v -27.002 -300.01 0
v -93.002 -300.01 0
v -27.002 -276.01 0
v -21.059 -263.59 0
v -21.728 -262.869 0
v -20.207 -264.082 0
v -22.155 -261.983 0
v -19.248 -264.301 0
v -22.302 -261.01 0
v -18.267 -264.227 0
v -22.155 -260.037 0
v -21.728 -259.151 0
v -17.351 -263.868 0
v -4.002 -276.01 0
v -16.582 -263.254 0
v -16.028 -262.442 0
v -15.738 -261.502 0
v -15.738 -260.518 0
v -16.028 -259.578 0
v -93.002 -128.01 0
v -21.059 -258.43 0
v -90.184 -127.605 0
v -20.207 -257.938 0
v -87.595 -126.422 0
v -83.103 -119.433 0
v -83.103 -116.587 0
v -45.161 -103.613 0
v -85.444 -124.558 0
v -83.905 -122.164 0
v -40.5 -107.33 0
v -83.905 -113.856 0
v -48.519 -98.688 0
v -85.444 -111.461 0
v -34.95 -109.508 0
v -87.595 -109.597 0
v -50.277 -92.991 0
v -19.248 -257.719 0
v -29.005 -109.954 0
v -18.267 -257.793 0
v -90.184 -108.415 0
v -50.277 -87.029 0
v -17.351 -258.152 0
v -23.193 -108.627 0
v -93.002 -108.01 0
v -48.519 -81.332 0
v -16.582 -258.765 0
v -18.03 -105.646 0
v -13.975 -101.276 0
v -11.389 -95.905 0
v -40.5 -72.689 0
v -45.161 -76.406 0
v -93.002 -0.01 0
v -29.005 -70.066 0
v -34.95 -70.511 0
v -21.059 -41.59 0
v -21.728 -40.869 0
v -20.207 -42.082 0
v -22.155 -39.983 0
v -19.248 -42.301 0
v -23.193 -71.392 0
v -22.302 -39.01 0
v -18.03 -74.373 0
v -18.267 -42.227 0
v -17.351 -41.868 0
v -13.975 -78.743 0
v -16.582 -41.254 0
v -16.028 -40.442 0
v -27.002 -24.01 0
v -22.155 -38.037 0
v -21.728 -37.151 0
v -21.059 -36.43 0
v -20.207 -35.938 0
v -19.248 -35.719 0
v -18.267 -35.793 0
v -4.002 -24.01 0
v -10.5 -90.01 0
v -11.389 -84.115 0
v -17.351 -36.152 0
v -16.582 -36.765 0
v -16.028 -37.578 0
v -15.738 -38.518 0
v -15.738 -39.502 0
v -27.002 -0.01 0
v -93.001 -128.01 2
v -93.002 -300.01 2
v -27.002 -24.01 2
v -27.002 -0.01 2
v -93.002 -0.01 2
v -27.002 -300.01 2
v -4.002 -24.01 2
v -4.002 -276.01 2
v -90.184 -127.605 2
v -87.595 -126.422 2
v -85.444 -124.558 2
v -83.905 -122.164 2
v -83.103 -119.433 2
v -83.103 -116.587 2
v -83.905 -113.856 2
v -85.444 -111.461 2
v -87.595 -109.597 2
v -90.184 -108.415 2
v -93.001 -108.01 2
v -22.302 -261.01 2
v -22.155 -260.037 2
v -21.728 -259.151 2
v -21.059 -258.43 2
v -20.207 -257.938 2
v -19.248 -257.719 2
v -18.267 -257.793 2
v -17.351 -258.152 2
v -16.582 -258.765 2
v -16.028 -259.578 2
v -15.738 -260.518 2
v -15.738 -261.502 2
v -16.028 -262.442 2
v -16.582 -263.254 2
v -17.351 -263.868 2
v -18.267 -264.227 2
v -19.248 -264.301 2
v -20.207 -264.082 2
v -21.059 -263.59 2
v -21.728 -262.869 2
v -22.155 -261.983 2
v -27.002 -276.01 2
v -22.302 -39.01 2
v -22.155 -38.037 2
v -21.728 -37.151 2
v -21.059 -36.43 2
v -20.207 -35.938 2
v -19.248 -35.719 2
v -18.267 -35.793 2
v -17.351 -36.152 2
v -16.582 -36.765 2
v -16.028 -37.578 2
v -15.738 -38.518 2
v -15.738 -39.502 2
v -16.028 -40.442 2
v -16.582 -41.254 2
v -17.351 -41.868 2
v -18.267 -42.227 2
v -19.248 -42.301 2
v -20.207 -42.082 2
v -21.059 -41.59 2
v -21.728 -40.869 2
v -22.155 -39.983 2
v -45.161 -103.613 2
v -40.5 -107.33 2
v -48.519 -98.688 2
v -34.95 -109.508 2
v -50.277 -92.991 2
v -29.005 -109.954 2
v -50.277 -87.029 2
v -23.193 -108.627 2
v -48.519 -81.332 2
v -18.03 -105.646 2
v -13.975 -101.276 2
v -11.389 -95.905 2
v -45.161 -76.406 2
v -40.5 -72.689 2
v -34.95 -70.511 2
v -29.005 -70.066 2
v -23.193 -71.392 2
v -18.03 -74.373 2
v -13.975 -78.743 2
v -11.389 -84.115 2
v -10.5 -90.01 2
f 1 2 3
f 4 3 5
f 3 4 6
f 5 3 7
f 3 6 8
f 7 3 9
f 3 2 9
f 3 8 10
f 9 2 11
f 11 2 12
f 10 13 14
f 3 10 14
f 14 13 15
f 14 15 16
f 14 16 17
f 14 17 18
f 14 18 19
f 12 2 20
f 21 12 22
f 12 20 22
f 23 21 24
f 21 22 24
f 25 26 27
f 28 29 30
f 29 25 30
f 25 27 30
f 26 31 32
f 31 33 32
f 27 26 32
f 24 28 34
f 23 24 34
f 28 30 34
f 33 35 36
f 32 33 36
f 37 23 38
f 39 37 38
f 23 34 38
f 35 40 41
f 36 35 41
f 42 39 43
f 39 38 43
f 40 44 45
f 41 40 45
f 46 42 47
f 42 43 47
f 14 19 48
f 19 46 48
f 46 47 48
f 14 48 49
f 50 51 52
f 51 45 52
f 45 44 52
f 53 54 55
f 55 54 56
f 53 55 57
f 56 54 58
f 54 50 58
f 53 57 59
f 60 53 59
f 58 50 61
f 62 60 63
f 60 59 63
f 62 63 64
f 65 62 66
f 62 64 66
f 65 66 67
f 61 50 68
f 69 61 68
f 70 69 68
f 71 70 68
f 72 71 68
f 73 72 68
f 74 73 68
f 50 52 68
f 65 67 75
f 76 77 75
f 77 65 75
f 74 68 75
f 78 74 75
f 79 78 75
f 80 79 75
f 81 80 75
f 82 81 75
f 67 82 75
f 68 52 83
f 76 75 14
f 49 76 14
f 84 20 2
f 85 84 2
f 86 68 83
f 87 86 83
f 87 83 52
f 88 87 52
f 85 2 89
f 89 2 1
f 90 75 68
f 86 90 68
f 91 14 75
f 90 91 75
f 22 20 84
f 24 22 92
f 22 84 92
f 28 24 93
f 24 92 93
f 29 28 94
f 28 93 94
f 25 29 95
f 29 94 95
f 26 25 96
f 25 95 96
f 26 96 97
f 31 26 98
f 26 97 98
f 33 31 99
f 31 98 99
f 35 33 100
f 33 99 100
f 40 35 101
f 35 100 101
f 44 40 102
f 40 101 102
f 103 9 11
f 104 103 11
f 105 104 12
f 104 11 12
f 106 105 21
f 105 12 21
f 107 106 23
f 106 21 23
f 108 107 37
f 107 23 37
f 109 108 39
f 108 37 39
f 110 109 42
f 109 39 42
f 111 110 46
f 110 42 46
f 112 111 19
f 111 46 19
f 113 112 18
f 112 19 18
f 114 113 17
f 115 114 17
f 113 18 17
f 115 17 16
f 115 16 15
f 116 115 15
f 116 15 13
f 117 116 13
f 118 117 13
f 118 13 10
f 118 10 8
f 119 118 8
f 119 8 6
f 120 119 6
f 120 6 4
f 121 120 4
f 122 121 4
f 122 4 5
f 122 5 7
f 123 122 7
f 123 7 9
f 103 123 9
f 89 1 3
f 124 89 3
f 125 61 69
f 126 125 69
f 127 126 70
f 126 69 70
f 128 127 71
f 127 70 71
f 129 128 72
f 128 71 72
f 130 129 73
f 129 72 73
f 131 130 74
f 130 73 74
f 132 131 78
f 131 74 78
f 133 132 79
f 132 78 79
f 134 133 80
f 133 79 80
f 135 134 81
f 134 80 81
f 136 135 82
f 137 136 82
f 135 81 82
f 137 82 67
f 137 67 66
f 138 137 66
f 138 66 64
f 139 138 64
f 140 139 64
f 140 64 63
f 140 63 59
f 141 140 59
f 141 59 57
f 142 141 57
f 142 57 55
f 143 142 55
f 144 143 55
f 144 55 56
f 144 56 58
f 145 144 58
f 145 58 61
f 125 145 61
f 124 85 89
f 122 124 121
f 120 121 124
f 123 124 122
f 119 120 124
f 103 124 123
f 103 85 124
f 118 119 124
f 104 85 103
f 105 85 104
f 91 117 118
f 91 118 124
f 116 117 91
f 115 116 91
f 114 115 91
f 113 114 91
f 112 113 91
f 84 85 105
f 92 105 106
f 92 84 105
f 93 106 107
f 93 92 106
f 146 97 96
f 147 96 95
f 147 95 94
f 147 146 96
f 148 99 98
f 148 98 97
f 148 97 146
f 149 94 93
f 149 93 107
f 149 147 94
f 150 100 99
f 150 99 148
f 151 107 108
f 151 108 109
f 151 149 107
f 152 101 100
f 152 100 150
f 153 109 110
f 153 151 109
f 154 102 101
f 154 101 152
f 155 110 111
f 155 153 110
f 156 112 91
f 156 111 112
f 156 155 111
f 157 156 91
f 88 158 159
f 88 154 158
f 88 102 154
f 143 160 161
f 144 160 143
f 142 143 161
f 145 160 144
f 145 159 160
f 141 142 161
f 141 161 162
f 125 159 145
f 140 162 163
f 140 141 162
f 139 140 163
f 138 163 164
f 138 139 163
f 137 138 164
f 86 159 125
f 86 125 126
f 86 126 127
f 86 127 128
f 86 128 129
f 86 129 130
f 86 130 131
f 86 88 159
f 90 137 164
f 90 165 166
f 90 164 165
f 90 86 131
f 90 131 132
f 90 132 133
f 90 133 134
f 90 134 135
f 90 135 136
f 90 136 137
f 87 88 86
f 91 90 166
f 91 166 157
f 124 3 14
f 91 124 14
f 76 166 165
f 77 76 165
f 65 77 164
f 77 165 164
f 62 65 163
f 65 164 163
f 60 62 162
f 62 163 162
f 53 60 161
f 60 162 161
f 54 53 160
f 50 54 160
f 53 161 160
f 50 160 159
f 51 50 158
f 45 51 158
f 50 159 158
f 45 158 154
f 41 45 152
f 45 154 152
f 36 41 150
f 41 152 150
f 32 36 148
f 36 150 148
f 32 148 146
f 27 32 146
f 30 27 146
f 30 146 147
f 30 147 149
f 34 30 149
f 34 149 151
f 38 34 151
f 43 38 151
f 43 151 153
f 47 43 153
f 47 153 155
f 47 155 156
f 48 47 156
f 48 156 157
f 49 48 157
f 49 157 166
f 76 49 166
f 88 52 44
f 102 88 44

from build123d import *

# Parameters (mm, degrees)
AUFSATZ_LINEAR_AUSTRAGEN1_DEPTH = 2
SKIZZE2_R                       = 20
SKIZZE2_R_2                     = 10
SCHNITT_LINEAR_AUSTRAGEN1_DEPTH = 10
DURCHGANGSLOCH_F_R_M61_D        = 6.6


with BuildPart() as part:
    # Skizze1 → Aufsatz-Linear austragen1 (new body)
    with BuildSketch(Plane.XY):
        Polygon((-4.0015, -24.009838693), (-27.0015, -24.009838693), (-27.0015, -0.009838693), (-93.0015, -0.009838693), (-93.0015, -300.009838693), (-27.0015, -300.009838693), (-27.0015, -276.009838693), (-4.0015, -276.009838693), align=None)
    extrude(amount=AUFSATZ_LINEAR_AUSTRAGEN1_DEPTH)

    # Skizze2 → Schnitt-Linear austragen1 (cut)
    with BuildSketch(Plane.XY.offset(2)):
        with Locations((-30.5, -90.009838693)):
            Circle(SKIZZE2_R)
        with Locations((-93.0015, -118.009838693)):
            Circle(SKIZZE2_R_2)
    extrude(amount=-SCHNITT_LINEAR_AUSTRAGEN1_DEPTH, mode=Mode.SUBTRACT)

    # Durchgangsloch für M61 (through all)
    with Locations(Plane.XY.offset(2)):
        with Locations((-19.0015, -39.009838693), (-19.0015, -261.009838693)):
            Hole(DURCHGANGSLOCH_F_R_M61_D / 2)


solid = part.part
